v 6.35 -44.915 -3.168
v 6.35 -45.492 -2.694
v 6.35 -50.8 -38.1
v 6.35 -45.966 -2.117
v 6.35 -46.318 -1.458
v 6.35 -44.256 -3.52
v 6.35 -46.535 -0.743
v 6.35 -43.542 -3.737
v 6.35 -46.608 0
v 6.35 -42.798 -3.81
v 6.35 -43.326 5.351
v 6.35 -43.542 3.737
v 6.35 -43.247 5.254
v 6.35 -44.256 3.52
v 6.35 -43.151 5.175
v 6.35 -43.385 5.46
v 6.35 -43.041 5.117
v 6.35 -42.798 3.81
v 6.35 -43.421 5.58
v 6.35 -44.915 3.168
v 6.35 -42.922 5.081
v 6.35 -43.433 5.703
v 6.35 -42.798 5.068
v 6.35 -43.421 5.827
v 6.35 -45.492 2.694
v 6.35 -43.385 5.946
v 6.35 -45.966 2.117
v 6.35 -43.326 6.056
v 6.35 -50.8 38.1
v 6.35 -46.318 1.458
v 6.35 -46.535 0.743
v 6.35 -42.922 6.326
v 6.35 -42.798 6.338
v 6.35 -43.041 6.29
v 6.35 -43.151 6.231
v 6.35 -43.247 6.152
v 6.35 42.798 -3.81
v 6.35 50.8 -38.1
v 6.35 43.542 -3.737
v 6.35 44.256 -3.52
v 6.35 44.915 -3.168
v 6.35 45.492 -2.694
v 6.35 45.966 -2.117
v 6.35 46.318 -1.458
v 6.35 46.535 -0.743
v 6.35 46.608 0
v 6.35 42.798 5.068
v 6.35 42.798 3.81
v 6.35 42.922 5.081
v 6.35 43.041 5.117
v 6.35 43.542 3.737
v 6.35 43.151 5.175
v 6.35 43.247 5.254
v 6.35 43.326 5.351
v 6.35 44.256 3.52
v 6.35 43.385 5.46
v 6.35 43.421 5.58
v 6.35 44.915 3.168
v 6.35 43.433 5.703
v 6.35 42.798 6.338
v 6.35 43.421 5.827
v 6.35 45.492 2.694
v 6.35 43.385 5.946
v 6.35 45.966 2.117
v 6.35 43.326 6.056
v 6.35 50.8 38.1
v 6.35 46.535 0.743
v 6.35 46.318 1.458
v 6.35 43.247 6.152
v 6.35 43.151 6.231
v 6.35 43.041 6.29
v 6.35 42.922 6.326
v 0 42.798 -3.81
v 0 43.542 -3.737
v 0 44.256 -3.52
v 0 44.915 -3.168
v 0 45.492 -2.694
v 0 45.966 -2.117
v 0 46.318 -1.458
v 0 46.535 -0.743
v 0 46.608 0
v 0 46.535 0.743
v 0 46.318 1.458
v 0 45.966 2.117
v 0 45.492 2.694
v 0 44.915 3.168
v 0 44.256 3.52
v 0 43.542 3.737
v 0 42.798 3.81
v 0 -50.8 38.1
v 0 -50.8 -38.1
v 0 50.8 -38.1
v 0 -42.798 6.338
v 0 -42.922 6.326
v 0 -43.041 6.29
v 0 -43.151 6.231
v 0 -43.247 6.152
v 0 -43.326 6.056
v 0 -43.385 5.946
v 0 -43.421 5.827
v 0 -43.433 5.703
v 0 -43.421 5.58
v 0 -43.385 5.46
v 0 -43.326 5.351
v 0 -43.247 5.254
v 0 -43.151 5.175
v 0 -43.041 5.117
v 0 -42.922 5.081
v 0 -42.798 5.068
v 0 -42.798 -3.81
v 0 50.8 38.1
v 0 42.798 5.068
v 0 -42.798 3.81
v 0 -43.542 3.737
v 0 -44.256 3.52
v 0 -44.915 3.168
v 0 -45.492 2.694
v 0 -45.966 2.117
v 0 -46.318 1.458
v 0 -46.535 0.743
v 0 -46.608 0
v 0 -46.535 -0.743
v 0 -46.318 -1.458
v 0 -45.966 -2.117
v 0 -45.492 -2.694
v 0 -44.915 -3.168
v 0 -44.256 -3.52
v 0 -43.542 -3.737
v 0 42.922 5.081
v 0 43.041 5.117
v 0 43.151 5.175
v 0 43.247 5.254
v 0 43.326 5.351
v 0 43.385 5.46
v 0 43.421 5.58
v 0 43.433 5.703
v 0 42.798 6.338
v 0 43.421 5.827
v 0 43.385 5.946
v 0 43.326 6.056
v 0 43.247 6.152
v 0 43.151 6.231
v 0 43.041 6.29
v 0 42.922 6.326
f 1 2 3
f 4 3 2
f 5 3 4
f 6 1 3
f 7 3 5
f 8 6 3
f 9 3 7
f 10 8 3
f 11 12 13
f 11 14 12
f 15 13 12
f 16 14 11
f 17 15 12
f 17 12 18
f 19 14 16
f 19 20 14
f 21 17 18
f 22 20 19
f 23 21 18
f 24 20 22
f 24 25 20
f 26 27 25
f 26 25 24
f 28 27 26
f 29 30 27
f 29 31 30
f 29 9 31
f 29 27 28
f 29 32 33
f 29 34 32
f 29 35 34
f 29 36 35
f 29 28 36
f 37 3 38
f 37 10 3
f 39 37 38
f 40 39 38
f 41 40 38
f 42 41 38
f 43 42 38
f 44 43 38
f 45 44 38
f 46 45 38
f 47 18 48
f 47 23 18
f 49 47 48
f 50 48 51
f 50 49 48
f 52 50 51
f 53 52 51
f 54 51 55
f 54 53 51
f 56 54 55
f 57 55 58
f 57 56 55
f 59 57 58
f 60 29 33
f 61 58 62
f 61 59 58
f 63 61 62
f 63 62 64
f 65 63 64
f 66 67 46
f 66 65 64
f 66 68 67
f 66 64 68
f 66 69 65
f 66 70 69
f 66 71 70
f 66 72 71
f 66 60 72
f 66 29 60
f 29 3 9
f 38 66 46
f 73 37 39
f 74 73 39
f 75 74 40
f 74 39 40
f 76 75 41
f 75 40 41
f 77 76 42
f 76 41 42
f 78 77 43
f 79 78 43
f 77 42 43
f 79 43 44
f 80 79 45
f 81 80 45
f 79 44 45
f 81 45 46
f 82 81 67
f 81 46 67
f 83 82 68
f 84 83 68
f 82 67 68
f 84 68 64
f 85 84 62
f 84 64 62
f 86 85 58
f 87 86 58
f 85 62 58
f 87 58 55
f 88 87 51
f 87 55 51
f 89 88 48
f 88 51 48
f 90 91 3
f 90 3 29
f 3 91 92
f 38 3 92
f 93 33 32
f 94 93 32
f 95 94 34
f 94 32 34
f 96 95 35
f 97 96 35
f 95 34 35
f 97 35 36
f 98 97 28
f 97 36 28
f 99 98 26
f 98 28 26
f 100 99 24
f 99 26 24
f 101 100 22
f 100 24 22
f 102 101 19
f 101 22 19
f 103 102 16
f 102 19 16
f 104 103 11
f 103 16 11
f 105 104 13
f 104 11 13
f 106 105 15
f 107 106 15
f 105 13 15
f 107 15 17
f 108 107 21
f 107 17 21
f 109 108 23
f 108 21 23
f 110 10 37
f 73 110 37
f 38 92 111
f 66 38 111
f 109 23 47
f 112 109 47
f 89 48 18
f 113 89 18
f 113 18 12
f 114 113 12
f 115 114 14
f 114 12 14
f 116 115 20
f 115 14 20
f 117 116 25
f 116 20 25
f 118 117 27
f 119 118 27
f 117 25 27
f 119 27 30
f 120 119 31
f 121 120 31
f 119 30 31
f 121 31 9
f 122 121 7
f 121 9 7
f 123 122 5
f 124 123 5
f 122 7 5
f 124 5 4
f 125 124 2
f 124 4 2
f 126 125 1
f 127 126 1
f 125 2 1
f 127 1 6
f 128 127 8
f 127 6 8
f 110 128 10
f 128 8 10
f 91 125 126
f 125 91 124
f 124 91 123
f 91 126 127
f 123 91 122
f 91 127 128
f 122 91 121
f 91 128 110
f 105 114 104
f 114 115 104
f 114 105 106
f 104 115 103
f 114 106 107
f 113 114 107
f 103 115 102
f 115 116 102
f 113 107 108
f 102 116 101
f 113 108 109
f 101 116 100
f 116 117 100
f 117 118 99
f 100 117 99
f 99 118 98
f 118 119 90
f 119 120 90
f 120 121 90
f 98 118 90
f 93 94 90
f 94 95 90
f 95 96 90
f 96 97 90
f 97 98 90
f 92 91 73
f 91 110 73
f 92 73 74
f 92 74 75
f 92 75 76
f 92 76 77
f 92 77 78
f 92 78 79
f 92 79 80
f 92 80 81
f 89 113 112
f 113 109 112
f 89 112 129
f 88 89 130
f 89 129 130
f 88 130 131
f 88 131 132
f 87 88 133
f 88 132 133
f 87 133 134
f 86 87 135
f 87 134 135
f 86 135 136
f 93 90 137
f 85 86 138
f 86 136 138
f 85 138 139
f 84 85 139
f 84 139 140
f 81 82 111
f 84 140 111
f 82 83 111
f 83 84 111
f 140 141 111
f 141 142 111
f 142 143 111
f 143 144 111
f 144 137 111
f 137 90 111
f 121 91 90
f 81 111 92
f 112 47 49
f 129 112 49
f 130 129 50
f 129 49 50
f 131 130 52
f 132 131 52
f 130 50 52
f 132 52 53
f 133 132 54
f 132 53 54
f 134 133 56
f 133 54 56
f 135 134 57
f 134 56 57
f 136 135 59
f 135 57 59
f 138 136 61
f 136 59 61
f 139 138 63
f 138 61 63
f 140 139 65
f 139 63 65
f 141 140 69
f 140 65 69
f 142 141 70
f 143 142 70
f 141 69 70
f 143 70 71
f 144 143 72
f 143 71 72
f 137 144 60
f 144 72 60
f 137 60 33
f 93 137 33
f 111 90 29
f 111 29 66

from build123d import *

# Parameters (mm, degrees)
F0_W     = 101.6
F0_H     = 76.2
F1_DEPTH = 6.35
F3_DEPTH = 25.4
F5_DEPTH = 25.4


with BuildPart() as f1:
    # F0 (on Right) → F1 (new body)
    with BuildSketch(Plane.YZ):
        Rectangle(F0_W, F0_H)
    extrude(amount=F1_DEPTH)

    # F2 (on face) → F3 (cut)
    with BuildSketch(Plane.YZ.offset(6.35)):
        with BuildLine():
            Line((42.798216, 3.81), (-42.798216, 3.81))
            ThreePointArc((-42.798216, 3.81), (-46.608216, 0), (-42.798216, -3.81))
            Line((-42.798216, -3.81), (42.798216, -3.81))
            ThreePointArc((42.798216, -3.81), (46.608216, 0), (42.798216, 3.81))
        make_face()
    extrude(amount=-F3_DEPTH, mode=Mode.SUBTRACT)

    # F4 (on face) → F5 (cut)
    with BuildSketch(Plane.YZ.offset(6.35)):
        with BuildLine():
            Line((-42.798216, 5.068473), (42.798216, 5.068473))
            ThreePointArc((42.798216, 5.068473), (43.433216, 5.703473), (42.798216, 6.338473))
            Line((42.798216, 6.338473), (-42.798216, 6.338473))
            ThreePointArc((-42.798216, 6.338473), (-43.433216, 5.703473), (-42.798216, 5.068473))
        make_face()
    extrude(amount=-F5_DEPTH, mode=Mode.SUBTRACT)


solid = f1.part
